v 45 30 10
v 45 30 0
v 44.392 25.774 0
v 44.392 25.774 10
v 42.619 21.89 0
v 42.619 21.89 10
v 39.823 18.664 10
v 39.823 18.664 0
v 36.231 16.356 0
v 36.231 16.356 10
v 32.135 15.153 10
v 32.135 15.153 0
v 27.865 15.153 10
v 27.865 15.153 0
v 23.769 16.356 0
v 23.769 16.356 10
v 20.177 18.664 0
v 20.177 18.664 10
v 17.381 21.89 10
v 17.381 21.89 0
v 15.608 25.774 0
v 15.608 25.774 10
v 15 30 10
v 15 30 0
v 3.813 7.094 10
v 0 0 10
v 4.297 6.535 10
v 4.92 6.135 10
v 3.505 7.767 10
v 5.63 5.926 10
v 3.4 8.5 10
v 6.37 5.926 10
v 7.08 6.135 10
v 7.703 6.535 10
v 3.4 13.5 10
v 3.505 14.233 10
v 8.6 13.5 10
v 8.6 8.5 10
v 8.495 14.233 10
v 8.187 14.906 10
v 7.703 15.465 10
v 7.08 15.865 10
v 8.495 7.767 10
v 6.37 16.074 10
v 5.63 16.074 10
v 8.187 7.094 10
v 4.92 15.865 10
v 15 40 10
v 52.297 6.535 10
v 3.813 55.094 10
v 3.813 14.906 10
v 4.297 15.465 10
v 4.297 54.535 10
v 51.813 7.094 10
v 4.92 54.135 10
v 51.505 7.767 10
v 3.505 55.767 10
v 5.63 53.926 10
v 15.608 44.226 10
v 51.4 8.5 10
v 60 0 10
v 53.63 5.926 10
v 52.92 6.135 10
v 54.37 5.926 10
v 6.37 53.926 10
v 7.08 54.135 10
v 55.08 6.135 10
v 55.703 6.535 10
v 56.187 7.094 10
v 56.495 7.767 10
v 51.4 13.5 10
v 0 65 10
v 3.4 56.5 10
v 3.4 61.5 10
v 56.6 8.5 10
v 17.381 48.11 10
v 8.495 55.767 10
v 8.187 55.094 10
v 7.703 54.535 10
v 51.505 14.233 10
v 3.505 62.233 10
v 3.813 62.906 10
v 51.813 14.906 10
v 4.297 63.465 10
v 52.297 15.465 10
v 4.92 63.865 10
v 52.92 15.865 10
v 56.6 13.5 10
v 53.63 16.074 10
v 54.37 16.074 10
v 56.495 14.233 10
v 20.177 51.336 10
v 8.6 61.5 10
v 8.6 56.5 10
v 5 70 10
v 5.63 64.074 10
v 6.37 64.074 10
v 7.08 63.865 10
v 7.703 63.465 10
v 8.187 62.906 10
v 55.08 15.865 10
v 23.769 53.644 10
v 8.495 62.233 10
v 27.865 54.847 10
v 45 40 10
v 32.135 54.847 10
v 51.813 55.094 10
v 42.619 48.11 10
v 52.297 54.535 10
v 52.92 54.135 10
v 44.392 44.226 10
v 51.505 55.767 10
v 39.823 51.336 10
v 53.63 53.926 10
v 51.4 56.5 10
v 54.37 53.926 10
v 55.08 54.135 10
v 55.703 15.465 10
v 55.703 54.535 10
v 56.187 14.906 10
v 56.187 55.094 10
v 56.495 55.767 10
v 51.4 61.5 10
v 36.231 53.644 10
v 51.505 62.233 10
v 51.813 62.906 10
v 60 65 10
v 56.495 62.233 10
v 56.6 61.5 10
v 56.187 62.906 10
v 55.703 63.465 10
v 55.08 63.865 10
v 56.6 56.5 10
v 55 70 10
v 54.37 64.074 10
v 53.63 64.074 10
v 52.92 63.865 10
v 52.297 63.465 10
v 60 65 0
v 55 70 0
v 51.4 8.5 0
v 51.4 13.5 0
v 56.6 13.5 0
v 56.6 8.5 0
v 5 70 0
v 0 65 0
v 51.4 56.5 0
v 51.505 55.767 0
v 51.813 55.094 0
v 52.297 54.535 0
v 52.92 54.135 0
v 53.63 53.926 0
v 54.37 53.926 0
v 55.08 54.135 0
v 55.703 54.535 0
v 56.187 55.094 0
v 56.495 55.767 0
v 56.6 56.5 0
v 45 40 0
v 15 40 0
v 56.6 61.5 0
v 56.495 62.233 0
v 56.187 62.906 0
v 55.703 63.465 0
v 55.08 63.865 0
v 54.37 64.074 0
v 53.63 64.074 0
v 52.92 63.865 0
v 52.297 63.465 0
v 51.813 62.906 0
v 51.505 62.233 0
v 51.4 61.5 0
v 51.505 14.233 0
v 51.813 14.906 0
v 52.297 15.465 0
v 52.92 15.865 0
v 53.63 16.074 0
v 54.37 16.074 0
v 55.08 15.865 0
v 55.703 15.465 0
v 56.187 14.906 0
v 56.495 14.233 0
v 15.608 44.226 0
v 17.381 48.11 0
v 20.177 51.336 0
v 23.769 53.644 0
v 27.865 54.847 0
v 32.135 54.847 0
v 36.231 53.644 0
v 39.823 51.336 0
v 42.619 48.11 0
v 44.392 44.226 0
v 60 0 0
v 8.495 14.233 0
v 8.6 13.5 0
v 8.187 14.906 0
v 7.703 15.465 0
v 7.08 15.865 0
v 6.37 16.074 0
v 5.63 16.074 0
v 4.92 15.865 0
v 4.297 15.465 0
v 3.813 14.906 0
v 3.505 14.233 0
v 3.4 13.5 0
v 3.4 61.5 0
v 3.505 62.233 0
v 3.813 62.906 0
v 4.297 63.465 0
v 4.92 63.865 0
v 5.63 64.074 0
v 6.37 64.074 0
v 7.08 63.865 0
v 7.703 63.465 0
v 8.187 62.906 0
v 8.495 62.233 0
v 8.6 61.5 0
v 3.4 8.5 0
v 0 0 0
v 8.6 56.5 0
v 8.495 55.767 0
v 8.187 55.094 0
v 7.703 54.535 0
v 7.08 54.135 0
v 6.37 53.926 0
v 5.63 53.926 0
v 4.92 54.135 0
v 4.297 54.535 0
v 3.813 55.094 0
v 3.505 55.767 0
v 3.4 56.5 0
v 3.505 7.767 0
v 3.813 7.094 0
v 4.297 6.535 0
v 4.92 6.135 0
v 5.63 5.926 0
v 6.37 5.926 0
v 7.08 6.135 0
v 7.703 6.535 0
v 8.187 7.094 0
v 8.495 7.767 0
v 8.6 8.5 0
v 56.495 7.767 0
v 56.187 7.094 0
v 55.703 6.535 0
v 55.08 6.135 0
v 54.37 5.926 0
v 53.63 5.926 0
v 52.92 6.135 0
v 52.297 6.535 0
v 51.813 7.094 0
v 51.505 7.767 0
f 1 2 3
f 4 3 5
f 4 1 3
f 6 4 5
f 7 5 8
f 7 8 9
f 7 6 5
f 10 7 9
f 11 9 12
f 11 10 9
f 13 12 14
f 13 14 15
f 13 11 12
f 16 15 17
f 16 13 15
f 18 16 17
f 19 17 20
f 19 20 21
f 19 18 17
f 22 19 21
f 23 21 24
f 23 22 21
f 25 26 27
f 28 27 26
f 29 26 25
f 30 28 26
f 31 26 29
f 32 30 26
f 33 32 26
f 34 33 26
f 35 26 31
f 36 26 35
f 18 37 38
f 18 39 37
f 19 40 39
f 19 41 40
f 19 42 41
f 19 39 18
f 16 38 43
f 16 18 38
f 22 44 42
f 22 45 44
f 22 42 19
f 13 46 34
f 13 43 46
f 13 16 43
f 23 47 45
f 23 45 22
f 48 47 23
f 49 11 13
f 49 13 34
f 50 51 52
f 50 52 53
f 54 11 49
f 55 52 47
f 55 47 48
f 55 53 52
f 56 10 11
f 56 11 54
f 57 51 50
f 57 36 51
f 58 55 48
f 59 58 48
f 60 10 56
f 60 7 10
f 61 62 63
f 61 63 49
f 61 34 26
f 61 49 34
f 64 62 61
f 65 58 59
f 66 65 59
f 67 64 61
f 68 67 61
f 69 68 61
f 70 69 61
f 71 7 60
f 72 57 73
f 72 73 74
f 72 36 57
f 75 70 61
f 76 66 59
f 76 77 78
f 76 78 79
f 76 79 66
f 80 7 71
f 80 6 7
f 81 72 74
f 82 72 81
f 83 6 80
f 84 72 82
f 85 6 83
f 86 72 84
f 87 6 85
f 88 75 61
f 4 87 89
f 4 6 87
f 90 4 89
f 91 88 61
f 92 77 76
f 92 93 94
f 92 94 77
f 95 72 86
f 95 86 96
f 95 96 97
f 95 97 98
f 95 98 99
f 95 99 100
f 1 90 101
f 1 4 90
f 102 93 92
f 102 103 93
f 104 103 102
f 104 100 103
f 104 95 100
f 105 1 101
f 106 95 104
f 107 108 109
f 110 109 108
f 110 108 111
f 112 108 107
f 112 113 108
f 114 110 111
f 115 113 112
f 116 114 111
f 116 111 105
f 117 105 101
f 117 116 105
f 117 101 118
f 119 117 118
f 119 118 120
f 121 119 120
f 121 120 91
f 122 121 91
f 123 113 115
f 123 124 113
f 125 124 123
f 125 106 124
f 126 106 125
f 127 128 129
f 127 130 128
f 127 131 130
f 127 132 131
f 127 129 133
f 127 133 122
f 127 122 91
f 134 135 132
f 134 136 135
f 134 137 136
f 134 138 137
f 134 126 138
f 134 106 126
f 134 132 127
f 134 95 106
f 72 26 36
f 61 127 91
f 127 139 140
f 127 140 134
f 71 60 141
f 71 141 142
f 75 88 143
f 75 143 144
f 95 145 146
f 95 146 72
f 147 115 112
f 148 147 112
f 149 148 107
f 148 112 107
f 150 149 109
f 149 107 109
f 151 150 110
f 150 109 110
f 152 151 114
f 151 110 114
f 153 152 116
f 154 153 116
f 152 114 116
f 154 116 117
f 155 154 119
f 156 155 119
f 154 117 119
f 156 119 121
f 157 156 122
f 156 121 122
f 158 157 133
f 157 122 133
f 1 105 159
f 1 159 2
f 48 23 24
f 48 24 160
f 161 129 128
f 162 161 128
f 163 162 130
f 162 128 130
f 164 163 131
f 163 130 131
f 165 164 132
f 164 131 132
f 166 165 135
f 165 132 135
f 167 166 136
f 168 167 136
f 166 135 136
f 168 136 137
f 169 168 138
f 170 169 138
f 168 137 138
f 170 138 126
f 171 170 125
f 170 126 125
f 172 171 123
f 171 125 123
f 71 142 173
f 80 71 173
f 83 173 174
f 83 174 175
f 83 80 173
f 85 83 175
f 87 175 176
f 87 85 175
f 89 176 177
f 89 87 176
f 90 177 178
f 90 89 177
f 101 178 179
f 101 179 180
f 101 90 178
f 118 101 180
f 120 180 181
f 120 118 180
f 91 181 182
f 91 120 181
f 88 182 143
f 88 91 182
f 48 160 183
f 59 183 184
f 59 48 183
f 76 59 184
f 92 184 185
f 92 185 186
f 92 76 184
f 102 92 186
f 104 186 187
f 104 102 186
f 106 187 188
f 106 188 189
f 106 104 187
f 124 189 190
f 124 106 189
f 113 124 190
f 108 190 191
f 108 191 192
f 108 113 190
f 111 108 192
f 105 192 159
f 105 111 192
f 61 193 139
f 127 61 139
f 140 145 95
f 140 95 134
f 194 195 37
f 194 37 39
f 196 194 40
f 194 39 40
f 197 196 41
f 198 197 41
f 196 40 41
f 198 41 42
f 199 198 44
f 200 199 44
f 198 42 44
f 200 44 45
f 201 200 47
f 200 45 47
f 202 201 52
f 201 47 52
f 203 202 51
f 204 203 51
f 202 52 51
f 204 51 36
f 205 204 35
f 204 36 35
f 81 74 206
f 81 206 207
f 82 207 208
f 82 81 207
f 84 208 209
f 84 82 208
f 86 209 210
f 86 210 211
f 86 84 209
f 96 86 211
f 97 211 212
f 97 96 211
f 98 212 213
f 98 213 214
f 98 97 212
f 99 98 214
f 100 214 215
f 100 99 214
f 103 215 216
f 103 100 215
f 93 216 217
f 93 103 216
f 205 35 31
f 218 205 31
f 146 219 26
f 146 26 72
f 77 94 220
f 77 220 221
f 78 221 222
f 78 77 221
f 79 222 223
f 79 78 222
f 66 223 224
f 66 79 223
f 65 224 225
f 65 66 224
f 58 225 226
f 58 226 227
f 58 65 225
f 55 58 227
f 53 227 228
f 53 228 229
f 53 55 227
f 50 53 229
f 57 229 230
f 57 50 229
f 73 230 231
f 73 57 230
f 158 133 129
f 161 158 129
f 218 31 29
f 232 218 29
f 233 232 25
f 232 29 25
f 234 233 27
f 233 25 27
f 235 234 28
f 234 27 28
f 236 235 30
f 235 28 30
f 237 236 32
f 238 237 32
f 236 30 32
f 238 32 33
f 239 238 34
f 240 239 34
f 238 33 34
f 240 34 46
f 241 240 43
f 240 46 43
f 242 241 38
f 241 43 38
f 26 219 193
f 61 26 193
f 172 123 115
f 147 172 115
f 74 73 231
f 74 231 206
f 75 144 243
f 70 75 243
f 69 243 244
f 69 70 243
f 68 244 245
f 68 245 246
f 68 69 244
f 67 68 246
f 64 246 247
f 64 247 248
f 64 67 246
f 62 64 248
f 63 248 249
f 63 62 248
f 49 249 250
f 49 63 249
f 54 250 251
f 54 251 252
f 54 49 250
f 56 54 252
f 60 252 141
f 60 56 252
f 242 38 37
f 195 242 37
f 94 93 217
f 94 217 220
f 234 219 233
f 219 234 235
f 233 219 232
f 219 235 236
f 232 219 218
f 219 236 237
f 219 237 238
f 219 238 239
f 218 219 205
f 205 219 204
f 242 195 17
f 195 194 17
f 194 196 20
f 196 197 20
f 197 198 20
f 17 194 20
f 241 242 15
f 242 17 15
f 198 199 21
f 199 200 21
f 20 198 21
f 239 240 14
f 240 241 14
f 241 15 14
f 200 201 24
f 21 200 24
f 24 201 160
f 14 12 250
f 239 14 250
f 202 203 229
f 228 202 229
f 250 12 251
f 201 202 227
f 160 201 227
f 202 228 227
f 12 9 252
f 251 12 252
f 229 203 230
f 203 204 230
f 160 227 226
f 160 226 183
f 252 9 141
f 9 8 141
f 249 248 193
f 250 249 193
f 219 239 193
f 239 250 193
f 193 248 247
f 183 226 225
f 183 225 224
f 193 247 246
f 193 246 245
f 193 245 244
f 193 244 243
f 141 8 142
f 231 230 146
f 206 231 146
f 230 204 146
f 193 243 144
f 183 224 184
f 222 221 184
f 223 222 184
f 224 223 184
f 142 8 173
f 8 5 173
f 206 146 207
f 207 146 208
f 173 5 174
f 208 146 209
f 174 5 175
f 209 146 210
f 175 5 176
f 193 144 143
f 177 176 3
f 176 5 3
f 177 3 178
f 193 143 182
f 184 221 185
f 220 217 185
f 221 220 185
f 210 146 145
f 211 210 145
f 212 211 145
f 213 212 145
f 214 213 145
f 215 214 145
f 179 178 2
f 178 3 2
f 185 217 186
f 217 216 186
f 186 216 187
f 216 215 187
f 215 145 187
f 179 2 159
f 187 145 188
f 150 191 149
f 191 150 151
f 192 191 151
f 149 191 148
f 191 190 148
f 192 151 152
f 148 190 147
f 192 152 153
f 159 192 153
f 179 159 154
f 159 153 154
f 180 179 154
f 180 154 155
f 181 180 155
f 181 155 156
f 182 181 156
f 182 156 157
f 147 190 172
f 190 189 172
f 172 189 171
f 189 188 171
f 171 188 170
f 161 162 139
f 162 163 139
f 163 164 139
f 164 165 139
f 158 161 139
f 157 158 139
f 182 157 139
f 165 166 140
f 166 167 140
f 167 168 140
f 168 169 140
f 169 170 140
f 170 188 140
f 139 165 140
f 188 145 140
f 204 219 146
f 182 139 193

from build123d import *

# Parameters (mm, degrees)
ESQUISSE1_W             = 60
ESQUISSE1_H             = 70
BOSS_EXTRU_1_DEPTH      = 10
ENL_V_MAT_EXTRU_1_DEPTH = 10
CHANFREIN1_SIZE         = 5


with BuildPart() as part:
    # Esquisse1 → Boss.-Extru.1 (new body)
    with BuildSketch(Plane.XY):
        with Locations((30, 35)):
            Rectangle(ESQUISSE1_W, ESQUISSE1_H)
    extrude(amount=BOSS_EXTRU_1_DEPTH)

    # Esquisse2 → Enlèv. mat.-Extru.1 (cut)
    with BuildSketch(Plane.XY.offset(10)):
        with BuildLine():
            Line((8.6, 61.5), (8.6, 56.5))
            ThreePointArc((8.6, 56.5), (6, 53.9), (3.4, 56.5))
            Line((3.4, 56.5), (3.4, 61.5))
            ThreePointArc((3.4, 61.5), (6, 64.1), (8.6, 61.5))
        make_face()
        with BuildLine():
            Line((51.4, 61.5), (51.4, 56.5))
            ThreePointArc((51.4, 56.5), (54, 53.9), (56.6, 56.5))
            Line((56.6, 56.5), (56.6, 61.5))
            ThreePointArc((56.6, 61.5), (54, 64.1), (51.4, 61.5))
        make_face()
        with BuildLine():
            Line((51.4, 8.5), (51.4, 13.5))
            ThreePointArc((51.4, 13.5), (54, 16.1), (56.6, 13.5))
            Line((56.6, 13.5), (56.6, 8.5))
            ThreePointArc((56.6, 8.5), (54, 5.9), (51.4, 8.5))
        make_face()
        with BuildLine():
            Line((8.6, 8.5), (8.6, 13.5))
            ThreePointArc((8.6, 13.5), (6, 16.1), (3.4, 13.5))
            Line((3.4, 13.5), (3.4, 8.5))
            ThreePointArc((3.4, 8.5), (6, 5.9), (8.6, 8.5))
        make_face()
        with BuildLine():
            Line((15, 30), (15, 40))
            ThreePointArc((15, 40), (30, 55), (45, 40))
            Line((45, 40), (45, 30))
            ThreePointArc((45, 30), (30, 15), (15, 30))
        make_face()
    extrude(amount=-ENL_V_MAT_EXTRU_1_DEPTH, mode=Mode.SUBTRACT)

    # Chanfrein1
    chanfrein1_edges = [part.edges().sort_by_distance(p)[0] for p in [
        (0, 70, 5),
        (60, 70, 5),
    ]]
    chamfer(chanfrein1_edges, length=CHANFREIN1_SIZE)


solid = part.part
